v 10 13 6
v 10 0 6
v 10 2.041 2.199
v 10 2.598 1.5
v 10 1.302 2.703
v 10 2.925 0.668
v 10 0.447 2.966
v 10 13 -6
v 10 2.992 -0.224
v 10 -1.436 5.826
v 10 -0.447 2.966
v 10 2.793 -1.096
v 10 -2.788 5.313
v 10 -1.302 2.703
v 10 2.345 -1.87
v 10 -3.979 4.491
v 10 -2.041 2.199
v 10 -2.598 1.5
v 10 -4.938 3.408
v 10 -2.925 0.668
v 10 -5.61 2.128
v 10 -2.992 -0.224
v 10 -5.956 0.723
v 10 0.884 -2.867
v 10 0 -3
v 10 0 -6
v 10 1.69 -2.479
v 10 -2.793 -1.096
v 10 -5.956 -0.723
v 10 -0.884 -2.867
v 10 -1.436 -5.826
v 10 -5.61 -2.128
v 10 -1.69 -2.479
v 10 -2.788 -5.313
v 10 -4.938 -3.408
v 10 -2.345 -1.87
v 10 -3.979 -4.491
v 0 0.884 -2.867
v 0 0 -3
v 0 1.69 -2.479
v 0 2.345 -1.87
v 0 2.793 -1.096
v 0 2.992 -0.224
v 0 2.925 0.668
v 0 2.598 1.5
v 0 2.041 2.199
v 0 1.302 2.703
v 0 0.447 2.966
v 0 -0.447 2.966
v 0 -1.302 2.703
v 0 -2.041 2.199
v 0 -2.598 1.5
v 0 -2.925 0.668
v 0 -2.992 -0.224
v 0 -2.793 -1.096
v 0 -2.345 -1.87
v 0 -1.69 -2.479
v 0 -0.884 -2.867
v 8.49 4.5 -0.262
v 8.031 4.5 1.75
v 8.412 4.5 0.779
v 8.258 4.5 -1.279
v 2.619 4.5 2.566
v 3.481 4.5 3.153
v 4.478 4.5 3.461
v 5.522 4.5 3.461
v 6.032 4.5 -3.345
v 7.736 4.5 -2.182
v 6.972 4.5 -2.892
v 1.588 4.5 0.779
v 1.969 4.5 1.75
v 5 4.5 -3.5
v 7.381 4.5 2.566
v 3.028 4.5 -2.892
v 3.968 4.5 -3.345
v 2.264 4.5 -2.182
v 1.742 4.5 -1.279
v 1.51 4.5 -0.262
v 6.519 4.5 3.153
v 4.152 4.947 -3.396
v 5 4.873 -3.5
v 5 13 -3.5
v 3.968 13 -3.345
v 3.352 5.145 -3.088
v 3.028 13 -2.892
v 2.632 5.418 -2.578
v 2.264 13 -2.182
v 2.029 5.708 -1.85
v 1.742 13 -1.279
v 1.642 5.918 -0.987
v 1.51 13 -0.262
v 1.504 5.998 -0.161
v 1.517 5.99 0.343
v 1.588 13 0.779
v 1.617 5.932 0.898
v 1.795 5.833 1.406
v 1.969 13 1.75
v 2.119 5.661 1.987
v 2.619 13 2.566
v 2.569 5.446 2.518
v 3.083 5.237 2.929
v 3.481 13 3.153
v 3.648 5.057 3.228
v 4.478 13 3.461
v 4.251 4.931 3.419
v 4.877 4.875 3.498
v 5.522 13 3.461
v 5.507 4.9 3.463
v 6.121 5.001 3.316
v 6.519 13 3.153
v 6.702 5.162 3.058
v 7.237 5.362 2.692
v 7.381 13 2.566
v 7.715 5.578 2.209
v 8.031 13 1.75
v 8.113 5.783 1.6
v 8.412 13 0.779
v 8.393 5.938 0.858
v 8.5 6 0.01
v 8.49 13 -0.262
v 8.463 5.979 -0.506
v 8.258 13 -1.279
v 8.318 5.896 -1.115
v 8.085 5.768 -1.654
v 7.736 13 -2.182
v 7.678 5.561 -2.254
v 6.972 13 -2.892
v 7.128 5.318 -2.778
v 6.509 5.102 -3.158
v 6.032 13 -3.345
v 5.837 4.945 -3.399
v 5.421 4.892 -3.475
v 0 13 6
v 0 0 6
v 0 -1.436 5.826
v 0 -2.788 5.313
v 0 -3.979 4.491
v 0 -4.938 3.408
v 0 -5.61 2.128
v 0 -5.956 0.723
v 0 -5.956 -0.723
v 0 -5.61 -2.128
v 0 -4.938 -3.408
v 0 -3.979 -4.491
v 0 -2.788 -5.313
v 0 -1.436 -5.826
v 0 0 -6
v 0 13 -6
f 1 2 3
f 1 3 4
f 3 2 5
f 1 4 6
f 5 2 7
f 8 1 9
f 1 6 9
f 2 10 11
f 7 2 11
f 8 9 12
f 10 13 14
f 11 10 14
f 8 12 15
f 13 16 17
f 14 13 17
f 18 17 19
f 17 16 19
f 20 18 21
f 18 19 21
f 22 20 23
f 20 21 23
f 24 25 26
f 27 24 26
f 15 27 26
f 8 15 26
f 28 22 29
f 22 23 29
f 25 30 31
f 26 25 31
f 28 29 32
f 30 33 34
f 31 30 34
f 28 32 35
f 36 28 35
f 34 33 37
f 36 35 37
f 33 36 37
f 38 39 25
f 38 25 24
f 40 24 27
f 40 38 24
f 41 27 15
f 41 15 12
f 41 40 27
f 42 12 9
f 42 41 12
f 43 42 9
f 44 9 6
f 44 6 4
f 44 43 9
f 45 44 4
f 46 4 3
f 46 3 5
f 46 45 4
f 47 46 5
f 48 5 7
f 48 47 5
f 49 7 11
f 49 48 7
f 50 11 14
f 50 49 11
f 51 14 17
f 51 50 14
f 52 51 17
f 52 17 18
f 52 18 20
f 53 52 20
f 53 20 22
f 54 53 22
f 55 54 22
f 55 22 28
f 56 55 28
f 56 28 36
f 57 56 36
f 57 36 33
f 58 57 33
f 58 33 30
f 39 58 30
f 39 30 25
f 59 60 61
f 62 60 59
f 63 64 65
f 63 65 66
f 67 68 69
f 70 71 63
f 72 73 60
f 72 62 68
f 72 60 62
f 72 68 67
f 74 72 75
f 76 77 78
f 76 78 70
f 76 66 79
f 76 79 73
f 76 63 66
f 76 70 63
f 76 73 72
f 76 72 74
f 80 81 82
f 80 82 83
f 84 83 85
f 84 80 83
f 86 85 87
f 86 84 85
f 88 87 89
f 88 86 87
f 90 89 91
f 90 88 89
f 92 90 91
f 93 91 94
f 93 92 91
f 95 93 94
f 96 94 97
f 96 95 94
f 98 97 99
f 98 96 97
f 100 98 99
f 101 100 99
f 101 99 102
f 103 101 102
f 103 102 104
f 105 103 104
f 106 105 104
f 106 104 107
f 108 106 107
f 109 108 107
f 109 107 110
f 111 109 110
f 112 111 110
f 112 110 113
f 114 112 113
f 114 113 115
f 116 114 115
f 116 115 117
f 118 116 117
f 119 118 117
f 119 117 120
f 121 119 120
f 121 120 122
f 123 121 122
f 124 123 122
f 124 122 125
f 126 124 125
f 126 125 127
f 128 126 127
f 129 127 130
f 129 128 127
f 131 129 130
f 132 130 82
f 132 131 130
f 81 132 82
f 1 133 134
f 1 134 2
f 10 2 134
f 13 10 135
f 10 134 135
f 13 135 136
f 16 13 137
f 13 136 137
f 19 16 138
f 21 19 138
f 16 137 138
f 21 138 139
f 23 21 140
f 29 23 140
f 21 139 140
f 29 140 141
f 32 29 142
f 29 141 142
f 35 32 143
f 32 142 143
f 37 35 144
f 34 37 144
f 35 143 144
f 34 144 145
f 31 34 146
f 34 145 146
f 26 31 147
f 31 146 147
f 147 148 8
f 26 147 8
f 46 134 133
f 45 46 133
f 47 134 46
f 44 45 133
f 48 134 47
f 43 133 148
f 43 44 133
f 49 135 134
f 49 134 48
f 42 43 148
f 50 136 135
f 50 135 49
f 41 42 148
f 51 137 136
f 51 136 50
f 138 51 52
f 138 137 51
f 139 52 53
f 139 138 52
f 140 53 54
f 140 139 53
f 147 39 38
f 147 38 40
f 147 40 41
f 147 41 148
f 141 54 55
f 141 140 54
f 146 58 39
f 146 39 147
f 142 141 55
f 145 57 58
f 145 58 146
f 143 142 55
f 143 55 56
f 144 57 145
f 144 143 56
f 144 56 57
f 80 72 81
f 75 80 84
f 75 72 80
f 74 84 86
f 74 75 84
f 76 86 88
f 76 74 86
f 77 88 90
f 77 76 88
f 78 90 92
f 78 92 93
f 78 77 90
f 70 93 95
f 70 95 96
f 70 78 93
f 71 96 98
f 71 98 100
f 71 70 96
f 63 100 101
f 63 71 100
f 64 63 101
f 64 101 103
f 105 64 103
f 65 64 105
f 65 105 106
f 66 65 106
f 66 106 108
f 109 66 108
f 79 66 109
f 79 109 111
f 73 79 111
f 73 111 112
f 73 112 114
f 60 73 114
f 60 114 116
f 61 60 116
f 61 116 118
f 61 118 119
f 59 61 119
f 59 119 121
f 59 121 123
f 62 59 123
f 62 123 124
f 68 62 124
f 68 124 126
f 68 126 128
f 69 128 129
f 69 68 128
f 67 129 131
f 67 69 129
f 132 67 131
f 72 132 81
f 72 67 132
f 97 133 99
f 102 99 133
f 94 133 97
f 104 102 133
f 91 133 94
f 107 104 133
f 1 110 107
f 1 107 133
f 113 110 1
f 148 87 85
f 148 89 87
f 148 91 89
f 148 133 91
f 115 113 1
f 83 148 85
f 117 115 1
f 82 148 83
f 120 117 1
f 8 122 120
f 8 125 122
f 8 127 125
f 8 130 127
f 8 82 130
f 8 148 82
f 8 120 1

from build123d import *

# Parameters (mm, degrees)
SKETCH_1_R          = 6
SKETCH_1_R_2        = 3
EXTRUDE_1_DEPTH     = 10
SKETCH_2_W          = 10
SKETCH_2_H          = 12
SKETCH_2_R          = 3.5
EXTRUDE_2_DEPTH     = 13
CUT_EXTRUDE_START   = -13
SKETCH_4_R          = 3
CUT_EXTRUDE_1_DEPTH = 13
CUT_EXTRUDE_START_2 = -8.5
SKETCH_5_R          = 3.5
CUT_EXTRUDE_2_DEPTH = 8.5


with BuildPart() as part:
    # 草图1 → 凸台-拉伸1 (new body)
    with BuildSketch(Plane(origin=(0, 0, 0), x_dir=(0, 0, -1), z_dir=(1, 0, 0))):
        Circle(SKETCH_1_R)
        Circle(SKETCH_1_R_2, mode=Mode.SUBTRACT)
    extrude(amount=EXTRUDE_1_DEPTH)

    # 草图2 → 凸台-拉伸2 (add)
    with BuildSketch(Plane(origin=(0, 0, 0), x_dir=(1, 0, 0), z_dir=(0, 1, 0))):
        with Locations((5, 0)):
            Rectangle(SKETCH_2_W, SKETCH_2_H)
        with Locations(Location((5, 0, 0), (0, 0, 90))):
            Circle(SKETCH_2_R, mode=Mode.SUBTRACT)
    extrude(amount=EXTRUDE_2_DEPTH)

    # 草图4 → 切除-拉伸1 (cut)
    with BuildSketch(Plane(origin=(10, 0, 0), x_dir=(0, 0, -1), z_dir=(1, 0, 0)).offset(CUT_EXTRUDE_START)):
        Circle(SKETCH_4_R)
    extrude(amount=CUT_EXTRUDE_1_DEPTH, mode=Mode.SUBTRACT)

    # 草图5 → 切除-拉伸2 (cut)
    with BuildSketch(Plane(origin=(0, 13, 0), x_dir=(1, 0, 0), z_dir=(0, 1, 0)).offset(CUT_EXTRUDE_START_2)):
        with Locations(Location((5, 0, 0), (0, 0, 90))):
            Circle(SKETCH_5_R)
    extrude(amount=CUT_EXTRUDE_2_DEPTH, mode=Mode.SUBTRACT)


solid = part.part
